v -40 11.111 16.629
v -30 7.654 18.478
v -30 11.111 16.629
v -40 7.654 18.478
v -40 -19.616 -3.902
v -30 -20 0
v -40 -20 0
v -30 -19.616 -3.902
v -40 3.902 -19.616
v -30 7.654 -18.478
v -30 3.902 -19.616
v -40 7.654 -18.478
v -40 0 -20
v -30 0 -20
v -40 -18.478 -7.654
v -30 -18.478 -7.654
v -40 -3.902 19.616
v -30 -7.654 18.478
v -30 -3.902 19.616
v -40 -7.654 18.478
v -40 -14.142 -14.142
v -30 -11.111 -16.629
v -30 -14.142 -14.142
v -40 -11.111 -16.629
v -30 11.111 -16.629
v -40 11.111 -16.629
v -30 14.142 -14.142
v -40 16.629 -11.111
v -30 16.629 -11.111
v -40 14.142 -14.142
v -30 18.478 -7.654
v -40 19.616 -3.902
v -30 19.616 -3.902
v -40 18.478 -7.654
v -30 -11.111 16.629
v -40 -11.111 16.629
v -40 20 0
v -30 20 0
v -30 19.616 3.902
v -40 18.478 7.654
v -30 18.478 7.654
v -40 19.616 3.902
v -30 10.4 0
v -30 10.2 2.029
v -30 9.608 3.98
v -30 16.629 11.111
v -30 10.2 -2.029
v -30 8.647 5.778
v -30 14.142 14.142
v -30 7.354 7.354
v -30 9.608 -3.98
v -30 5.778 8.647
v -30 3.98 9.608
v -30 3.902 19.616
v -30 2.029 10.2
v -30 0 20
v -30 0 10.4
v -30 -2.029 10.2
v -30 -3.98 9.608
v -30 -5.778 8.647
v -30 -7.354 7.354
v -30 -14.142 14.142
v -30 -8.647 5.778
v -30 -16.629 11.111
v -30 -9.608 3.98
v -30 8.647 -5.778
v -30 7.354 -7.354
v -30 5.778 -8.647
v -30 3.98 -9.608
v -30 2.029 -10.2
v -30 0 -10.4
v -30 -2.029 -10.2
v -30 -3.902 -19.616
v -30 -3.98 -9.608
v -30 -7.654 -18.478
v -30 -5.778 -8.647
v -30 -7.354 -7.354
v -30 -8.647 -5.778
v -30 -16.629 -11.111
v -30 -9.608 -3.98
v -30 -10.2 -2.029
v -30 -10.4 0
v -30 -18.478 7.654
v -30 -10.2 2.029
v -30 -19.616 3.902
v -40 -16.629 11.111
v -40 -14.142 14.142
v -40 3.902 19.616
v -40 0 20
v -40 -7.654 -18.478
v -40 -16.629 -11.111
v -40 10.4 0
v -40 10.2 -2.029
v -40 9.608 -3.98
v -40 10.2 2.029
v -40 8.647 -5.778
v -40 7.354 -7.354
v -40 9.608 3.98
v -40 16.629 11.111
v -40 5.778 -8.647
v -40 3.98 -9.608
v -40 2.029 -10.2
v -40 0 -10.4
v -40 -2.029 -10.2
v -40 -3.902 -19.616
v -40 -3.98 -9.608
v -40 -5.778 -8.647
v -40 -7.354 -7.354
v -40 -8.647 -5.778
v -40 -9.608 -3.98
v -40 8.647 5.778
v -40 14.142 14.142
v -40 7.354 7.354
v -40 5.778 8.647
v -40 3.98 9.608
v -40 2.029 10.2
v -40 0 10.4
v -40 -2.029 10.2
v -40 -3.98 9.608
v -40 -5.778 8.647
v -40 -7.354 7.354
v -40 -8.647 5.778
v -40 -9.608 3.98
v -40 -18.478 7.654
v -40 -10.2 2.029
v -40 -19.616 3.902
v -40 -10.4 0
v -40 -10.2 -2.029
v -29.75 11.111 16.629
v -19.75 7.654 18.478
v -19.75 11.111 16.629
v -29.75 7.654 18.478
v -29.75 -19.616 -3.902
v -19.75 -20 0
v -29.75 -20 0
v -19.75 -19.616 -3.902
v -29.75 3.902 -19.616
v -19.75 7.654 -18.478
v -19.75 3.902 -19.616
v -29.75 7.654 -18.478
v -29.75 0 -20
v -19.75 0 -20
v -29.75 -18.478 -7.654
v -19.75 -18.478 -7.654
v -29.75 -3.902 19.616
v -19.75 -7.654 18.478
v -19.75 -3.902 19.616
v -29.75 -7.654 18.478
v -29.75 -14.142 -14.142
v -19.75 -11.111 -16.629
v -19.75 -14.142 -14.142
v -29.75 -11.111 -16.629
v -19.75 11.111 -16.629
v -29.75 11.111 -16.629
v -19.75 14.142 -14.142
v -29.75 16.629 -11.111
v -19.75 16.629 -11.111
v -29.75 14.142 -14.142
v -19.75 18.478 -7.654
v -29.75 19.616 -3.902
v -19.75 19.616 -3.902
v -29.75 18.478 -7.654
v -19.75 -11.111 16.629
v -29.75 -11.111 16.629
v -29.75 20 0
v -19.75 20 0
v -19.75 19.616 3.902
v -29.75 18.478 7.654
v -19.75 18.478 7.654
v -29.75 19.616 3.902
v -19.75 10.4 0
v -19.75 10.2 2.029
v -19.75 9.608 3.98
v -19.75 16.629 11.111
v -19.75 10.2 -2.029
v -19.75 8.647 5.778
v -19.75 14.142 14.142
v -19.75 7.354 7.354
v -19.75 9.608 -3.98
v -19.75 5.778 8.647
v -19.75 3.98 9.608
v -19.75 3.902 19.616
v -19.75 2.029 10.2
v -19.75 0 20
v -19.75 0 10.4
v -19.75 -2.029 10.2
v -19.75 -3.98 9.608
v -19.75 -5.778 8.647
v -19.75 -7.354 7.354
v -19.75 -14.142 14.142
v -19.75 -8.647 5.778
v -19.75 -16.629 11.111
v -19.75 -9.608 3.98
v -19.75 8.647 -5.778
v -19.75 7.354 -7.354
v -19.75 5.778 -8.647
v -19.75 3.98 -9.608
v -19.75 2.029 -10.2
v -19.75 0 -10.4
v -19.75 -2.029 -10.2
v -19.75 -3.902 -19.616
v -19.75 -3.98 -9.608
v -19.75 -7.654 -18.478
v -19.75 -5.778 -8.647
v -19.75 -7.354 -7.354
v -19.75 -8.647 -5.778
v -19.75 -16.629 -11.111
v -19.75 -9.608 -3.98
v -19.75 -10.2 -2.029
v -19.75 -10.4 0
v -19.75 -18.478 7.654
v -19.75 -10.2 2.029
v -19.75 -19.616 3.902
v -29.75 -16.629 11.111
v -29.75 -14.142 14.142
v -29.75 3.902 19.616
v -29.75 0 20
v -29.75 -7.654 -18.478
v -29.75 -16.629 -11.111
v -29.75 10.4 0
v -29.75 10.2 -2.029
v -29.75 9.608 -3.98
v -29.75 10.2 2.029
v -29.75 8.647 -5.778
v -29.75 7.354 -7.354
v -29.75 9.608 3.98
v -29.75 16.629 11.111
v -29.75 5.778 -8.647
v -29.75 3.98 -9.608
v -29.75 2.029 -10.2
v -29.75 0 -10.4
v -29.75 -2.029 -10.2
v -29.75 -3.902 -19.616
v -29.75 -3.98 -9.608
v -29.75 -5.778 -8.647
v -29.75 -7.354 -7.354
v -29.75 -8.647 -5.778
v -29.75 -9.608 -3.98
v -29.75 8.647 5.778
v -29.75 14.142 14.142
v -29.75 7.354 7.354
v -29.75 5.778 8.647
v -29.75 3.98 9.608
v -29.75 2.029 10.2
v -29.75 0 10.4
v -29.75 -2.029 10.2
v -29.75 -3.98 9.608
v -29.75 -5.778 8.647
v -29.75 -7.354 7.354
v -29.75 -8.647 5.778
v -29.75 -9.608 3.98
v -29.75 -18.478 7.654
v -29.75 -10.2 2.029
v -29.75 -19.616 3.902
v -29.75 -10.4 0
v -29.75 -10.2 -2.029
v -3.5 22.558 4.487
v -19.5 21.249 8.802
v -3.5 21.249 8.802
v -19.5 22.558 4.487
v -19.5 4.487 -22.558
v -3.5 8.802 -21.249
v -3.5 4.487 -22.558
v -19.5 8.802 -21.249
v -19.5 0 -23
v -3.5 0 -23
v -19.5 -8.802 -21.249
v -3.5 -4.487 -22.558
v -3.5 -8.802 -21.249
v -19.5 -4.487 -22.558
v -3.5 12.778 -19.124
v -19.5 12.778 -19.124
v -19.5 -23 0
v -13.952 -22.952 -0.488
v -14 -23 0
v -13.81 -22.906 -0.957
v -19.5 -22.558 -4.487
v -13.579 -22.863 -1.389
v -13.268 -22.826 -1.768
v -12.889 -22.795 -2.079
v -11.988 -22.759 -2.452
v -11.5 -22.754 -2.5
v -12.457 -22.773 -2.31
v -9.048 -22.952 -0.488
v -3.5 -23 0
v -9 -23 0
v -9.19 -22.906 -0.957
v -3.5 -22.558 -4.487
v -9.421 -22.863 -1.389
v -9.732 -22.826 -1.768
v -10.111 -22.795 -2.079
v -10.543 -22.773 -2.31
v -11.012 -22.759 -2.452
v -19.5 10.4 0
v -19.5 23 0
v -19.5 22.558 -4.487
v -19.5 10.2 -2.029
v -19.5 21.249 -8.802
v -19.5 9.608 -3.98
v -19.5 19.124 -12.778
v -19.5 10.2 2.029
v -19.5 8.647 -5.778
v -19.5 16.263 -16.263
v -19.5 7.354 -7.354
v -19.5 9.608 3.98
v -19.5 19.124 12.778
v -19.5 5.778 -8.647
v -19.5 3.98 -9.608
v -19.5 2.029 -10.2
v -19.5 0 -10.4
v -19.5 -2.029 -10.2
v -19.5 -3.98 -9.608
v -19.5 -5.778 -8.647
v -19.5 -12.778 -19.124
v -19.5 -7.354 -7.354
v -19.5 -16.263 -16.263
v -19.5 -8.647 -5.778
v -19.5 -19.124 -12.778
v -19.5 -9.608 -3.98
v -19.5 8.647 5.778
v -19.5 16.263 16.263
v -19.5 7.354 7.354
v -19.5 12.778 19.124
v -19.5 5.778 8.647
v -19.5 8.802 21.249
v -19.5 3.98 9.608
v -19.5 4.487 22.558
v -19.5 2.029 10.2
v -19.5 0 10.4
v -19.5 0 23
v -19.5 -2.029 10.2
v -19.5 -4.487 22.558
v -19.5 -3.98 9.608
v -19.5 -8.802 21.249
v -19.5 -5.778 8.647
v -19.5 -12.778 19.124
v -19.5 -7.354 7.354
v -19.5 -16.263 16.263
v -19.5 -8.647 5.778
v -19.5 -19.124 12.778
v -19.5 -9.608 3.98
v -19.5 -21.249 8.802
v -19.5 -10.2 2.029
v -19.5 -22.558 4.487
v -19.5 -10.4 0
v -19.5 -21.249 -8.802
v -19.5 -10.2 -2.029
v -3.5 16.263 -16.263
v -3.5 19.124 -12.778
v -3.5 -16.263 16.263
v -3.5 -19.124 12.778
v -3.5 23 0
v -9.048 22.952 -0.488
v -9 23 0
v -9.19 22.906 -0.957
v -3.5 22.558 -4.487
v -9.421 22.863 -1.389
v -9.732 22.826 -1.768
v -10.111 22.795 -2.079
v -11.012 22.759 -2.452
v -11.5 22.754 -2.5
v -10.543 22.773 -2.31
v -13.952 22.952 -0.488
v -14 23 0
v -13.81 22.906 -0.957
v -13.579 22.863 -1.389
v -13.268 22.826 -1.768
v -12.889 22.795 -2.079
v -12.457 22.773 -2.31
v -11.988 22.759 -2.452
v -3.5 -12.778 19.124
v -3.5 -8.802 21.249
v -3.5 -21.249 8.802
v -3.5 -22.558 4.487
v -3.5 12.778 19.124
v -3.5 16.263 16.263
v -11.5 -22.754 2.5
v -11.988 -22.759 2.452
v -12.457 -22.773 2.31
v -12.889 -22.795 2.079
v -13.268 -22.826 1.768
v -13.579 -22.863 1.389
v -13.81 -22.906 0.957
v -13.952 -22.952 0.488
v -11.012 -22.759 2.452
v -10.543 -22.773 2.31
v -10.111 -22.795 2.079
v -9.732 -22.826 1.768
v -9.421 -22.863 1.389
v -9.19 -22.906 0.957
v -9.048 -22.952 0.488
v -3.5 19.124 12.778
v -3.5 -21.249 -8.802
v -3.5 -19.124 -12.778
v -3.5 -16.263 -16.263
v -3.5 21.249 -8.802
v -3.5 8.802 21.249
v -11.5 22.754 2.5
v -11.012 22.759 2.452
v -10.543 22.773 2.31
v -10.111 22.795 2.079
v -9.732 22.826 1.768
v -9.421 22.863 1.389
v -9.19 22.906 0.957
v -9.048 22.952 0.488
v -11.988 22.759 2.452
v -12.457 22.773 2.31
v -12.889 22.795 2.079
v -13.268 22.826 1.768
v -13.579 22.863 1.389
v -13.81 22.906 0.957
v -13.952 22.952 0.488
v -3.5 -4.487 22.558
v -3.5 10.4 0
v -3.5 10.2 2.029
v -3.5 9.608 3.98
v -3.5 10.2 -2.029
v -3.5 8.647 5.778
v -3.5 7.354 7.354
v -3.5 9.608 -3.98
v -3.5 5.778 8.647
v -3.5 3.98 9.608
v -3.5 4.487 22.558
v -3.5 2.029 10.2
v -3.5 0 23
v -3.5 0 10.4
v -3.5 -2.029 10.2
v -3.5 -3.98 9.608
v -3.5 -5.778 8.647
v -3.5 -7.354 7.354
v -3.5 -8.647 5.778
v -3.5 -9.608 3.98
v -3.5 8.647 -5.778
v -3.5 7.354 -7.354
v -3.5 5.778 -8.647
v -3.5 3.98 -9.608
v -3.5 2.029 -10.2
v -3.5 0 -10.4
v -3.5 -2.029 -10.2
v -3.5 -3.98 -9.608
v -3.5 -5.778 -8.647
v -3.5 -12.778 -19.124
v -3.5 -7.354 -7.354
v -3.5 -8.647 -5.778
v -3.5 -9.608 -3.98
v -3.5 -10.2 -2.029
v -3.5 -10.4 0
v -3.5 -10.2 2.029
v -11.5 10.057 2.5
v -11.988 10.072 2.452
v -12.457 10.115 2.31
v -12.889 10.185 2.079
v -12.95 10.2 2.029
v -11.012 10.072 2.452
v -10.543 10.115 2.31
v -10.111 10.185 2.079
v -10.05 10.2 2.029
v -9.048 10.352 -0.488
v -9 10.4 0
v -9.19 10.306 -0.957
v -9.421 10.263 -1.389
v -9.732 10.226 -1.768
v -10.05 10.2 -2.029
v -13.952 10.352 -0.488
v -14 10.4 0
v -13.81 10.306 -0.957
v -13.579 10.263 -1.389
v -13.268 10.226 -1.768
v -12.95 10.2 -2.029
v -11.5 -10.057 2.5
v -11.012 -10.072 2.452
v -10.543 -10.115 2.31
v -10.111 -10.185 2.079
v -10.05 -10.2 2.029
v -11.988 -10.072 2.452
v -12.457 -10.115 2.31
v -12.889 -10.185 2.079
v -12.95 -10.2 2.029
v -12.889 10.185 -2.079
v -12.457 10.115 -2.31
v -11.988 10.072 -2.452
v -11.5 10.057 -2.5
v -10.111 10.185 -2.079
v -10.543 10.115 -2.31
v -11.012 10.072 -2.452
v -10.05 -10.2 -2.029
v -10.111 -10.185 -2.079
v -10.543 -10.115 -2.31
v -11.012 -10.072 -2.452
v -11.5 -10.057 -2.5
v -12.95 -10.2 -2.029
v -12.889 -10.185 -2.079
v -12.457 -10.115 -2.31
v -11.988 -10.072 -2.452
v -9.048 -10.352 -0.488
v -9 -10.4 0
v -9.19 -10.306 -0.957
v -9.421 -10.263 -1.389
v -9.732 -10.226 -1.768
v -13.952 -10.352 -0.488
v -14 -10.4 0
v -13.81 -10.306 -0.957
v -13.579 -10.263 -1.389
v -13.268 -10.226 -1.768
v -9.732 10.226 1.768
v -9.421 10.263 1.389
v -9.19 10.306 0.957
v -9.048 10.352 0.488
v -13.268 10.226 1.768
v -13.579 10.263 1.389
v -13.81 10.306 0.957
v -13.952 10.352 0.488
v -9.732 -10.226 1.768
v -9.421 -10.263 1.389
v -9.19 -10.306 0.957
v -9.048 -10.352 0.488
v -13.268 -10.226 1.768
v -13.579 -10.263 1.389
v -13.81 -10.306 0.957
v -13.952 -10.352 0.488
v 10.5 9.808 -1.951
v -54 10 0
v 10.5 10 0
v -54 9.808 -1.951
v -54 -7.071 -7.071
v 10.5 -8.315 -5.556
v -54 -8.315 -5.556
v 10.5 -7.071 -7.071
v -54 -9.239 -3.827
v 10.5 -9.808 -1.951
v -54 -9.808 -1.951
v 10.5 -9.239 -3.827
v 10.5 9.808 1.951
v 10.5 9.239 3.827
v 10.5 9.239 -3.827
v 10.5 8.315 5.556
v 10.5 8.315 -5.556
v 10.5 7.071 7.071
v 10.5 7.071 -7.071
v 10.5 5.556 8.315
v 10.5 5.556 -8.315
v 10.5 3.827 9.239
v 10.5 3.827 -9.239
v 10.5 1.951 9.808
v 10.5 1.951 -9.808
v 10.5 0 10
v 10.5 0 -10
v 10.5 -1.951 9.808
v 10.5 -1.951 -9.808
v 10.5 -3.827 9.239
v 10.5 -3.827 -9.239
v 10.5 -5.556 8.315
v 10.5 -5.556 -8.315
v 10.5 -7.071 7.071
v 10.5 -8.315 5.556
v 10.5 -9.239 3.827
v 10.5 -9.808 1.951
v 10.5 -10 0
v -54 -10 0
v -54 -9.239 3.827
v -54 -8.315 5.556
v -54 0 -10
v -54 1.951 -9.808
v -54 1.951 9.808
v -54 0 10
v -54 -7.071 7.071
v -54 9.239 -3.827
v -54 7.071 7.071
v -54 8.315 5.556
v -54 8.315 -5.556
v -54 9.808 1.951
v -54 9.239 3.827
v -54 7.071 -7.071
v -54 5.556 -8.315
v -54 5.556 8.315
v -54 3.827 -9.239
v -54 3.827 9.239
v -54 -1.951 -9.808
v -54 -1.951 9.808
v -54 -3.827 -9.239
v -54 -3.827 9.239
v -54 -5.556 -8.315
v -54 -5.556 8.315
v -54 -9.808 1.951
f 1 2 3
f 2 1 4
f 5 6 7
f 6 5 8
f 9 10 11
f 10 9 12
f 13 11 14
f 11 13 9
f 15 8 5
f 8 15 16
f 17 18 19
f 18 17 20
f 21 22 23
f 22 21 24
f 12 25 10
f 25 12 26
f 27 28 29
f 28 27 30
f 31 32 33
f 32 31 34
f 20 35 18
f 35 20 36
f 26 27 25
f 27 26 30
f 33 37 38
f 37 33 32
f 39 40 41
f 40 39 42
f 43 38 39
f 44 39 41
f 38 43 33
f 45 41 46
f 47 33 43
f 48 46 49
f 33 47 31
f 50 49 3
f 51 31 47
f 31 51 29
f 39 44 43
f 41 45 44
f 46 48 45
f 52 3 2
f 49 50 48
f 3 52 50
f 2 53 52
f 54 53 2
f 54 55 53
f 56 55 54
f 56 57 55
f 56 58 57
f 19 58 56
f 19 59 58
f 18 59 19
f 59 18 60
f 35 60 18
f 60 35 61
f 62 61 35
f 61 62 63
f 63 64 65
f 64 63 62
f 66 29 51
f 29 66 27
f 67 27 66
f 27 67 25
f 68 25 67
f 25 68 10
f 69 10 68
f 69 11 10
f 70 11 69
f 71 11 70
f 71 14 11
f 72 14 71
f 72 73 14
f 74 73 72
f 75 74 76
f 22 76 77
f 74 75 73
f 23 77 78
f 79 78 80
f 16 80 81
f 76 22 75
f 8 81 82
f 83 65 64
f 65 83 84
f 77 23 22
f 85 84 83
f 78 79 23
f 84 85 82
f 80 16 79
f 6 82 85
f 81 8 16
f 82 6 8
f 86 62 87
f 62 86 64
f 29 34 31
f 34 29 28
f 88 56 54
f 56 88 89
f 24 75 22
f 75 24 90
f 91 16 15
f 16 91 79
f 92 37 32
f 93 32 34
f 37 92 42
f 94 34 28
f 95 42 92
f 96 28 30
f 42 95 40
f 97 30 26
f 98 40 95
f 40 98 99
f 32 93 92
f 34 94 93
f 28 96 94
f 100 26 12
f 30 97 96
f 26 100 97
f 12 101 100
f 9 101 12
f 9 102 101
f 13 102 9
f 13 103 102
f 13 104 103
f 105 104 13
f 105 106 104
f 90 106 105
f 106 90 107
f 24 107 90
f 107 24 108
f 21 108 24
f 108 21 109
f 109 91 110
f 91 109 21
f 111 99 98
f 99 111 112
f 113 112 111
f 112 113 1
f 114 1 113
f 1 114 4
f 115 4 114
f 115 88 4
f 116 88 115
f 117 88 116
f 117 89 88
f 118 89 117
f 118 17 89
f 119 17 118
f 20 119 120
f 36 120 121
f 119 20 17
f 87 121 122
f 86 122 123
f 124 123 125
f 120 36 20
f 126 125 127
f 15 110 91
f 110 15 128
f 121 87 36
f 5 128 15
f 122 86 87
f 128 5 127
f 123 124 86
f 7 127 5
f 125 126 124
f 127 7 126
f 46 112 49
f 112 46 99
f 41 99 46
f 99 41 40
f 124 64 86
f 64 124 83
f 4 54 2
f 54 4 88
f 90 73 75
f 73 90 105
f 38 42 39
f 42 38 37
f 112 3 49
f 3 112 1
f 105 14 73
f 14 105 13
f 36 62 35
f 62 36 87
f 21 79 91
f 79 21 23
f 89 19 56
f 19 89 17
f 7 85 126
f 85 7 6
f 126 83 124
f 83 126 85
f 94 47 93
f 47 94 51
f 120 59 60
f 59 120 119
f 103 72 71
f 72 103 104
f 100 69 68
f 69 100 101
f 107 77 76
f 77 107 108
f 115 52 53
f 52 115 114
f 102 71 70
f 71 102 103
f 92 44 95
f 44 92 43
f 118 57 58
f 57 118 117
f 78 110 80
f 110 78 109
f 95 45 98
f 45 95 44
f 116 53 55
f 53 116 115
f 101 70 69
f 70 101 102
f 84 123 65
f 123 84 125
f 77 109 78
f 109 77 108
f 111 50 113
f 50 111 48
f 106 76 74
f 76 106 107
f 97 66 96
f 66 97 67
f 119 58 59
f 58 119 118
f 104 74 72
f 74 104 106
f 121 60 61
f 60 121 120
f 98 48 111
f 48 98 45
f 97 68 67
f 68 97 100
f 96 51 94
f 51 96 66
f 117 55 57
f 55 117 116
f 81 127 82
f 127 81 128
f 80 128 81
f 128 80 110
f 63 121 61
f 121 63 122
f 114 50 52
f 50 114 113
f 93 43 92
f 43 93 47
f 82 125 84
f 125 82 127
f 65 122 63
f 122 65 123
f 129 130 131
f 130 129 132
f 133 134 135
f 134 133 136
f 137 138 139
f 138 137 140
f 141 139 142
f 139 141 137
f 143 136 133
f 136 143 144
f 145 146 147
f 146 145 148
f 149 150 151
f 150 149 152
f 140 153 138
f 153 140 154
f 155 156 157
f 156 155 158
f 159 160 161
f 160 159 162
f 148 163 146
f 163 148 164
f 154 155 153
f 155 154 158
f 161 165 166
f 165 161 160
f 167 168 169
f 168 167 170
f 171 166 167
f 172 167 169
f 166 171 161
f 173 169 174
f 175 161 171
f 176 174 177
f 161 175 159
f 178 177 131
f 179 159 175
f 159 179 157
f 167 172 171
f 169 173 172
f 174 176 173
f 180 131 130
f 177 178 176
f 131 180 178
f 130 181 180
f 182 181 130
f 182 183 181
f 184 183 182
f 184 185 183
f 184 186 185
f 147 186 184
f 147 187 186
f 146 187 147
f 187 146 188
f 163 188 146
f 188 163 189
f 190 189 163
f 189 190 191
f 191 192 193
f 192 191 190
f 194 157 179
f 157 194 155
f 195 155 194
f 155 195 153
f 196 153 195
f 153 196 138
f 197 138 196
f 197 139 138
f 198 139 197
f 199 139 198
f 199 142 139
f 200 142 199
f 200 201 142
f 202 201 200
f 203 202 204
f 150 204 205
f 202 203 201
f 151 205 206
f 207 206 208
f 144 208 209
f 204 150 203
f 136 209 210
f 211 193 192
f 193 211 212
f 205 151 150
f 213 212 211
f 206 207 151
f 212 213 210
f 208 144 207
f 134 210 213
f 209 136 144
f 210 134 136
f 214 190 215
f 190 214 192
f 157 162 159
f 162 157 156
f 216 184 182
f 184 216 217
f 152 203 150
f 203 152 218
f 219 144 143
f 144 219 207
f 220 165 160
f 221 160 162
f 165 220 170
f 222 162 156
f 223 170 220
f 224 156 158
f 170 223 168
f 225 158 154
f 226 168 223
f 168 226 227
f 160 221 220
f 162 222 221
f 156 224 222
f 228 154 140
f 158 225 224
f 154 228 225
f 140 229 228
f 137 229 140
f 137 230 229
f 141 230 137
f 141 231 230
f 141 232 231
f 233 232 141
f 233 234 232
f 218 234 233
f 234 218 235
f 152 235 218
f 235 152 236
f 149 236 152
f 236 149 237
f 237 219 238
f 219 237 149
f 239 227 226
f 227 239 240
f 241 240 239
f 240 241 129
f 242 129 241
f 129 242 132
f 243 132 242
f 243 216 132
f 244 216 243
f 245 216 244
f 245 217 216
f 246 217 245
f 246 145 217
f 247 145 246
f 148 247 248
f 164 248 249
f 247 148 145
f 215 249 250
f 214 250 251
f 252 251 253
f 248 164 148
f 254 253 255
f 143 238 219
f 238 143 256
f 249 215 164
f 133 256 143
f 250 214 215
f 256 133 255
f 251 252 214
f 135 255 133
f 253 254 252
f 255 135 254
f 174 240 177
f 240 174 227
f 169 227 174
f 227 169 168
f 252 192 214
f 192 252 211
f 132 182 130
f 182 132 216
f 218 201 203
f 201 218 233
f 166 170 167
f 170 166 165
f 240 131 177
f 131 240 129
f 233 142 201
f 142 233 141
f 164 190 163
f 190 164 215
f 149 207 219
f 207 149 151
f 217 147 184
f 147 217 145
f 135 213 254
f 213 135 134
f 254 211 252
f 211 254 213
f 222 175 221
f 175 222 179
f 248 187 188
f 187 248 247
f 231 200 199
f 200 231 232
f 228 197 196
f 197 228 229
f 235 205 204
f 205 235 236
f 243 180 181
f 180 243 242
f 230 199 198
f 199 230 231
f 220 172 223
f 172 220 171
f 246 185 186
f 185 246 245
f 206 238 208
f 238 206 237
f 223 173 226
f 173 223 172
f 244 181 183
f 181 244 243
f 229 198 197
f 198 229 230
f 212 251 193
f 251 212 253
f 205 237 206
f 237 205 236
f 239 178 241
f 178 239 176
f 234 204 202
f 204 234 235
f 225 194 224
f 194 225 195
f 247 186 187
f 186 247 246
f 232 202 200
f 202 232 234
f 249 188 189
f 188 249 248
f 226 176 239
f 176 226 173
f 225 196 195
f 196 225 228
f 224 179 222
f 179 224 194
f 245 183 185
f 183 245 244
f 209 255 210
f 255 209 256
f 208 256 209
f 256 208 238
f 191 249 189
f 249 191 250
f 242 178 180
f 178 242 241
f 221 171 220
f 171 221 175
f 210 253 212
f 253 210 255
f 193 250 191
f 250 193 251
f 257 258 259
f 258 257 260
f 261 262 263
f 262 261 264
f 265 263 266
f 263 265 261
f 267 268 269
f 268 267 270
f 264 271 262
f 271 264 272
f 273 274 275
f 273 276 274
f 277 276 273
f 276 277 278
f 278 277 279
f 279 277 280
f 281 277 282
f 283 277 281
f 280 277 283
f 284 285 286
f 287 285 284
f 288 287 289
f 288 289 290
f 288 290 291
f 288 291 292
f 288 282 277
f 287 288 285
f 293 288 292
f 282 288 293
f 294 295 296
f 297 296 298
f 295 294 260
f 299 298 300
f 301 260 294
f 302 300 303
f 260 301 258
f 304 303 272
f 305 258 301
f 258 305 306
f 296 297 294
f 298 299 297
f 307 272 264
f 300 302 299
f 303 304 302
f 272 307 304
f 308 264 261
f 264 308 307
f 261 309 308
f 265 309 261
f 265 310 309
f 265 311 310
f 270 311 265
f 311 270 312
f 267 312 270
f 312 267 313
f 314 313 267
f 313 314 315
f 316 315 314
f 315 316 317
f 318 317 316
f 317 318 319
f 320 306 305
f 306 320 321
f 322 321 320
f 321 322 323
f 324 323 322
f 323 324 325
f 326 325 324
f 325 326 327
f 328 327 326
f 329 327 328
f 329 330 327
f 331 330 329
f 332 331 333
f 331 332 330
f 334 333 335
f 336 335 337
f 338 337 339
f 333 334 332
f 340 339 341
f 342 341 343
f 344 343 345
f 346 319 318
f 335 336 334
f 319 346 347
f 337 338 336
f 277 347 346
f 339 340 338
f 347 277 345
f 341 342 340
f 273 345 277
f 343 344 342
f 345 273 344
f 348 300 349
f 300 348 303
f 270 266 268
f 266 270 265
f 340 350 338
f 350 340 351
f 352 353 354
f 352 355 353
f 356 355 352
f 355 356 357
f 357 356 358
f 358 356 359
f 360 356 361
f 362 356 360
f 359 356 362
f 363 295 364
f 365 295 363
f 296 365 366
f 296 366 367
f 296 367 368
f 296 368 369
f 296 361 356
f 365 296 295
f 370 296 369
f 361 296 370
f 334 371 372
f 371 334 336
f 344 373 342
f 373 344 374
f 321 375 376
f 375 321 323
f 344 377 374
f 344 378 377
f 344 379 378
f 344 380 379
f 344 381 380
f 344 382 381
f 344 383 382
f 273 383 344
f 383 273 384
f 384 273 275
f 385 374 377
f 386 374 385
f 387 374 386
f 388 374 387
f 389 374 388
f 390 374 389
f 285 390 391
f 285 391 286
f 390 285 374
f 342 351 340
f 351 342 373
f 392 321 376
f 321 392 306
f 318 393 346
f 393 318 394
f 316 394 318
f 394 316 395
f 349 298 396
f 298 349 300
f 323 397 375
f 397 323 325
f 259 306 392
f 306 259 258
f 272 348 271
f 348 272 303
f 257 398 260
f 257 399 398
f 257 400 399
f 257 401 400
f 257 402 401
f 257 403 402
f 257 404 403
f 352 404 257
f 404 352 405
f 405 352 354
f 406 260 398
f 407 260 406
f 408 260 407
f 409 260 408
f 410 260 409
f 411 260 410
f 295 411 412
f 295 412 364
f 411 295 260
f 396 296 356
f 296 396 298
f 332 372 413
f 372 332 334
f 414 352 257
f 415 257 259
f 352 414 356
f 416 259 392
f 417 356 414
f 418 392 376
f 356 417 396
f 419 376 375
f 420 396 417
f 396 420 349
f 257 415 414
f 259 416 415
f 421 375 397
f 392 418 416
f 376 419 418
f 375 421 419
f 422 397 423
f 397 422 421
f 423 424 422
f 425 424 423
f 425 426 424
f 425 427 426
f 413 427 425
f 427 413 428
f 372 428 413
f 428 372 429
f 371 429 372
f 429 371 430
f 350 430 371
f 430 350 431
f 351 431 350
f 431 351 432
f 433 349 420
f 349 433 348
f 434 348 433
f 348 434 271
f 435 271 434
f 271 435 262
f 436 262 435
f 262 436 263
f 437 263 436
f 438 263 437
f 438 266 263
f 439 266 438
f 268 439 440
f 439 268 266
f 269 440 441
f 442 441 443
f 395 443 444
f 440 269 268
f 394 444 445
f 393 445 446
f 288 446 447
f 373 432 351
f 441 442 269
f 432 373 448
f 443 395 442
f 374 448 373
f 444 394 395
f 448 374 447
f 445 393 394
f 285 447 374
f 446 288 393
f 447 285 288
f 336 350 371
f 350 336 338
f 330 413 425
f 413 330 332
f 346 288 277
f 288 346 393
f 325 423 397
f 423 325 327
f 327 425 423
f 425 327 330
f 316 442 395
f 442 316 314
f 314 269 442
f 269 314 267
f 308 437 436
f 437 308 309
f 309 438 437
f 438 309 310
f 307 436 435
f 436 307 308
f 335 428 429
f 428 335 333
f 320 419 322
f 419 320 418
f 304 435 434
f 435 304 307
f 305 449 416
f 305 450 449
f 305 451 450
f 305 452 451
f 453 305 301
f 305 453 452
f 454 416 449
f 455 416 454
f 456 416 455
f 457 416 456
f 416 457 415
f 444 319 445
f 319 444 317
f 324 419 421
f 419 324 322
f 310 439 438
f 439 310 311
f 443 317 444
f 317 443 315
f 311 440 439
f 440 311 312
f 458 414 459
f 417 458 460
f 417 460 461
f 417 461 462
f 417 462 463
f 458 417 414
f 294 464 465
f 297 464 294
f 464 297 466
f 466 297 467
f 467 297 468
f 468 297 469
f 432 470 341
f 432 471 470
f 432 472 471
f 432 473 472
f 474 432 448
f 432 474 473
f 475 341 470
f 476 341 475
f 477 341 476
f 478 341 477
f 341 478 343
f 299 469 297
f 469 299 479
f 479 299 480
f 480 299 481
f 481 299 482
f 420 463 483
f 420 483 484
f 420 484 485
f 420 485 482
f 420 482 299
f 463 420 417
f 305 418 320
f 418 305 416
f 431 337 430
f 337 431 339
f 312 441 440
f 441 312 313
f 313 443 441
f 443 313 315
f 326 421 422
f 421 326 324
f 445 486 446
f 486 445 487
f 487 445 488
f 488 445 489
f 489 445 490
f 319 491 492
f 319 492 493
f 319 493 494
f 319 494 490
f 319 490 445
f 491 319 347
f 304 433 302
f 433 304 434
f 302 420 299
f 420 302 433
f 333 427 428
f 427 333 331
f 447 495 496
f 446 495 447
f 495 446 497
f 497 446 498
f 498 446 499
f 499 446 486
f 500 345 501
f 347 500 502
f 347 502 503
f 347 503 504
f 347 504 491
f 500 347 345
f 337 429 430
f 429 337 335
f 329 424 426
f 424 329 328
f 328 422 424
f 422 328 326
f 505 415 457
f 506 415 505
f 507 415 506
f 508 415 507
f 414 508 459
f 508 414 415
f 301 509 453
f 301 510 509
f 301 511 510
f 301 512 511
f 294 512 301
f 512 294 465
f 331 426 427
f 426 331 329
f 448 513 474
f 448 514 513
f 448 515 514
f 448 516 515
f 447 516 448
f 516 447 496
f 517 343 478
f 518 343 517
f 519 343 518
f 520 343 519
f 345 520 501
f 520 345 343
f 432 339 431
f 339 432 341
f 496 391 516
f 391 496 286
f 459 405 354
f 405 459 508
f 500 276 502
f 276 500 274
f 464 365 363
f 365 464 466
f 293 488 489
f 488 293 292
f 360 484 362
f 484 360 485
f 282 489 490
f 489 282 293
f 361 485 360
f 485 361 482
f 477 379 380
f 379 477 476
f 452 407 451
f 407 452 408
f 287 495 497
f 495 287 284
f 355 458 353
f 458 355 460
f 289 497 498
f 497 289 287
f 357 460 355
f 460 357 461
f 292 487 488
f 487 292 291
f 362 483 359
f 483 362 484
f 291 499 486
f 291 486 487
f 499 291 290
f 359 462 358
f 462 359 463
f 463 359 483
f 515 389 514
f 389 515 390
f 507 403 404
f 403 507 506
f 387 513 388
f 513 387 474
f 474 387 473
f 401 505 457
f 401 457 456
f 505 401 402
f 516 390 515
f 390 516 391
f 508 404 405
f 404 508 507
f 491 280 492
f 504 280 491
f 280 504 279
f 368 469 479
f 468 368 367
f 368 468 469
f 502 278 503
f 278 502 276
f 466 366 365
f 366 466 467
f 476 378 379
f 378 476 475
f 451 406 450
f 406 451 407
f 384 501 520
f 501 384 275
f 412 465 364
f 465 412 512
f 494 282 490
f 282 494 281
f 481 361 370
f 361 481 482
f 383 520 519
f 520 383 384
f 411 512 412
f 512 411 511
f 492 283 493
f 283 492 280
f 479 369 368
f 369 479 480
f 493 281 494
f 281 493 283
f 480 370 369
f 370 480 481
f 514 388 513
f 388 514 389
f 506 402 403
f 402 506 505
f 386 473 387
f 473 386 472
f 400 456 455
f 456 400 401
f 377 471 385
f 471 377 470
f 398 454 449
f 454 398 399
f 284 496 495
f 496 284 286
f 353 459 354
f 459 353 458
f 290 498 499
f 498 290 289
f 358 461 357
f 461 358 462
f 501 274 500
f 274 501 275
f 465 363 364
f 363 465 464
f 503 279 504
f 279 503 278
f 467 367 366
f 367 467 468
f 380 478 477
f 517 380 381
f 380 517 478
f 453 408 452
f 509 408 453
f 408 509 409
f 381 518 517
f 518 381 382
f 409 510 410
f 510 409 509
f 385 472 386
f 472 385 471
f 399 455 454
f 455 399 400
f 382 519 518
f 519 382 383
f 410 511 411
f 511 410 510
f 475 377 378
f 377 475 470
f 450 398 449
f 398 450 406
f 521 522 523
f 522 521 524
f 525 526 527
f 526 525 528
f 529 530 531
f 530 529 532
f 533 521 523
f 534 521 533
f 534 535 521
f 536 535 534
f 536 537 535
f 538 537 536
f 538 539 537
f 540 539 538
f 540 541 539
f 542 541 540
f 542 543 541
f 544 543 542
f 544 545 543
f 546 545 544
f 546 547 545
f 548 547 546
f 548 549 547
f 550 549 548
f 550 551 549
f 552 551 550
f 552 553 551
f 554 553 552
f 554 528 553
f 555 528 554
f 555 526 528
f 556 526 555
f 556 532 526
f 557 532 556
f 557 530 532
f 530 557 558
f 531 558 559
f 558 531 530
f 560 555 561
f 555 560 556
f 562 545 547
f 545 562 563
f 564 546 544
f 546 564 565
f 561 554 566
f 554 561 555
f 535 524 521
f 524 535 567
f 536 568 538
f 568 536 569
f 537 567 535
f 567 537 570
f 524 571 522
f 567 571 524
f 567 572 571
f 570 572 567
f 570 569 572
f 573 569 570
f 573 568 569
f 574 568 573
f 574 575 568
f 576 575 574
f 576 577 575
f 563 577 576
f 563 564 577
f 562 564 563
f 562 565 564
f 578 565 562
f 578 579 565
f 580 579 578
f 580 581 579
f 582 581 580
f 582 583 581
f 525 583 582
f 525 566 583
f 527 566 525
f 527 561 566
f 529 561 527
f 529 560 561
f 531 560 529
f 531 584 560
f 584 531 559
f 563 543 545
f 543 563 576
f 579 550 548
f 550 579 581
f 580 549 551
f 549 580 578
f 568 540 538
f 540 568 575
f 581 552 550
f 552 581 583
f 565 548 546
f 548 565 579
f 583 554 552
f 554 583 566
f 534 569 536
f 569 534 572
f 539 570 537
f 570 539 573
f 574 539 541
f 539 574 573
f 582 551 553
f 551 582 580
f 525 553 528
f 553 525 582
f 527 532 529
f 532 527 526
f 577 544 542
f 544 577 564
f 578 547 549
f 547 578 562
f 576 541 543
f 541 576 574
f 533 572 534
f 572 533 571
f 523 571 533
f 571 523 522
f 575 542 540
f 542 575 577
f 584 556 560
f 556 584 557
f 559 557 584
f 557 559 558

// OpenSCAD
$fn = 32;

// ------------------------------------------------------------------------
// Shaft with rings and collars: d20 shaft, 3 rings
// Every part is its own module, assembly() places them once.
// ------------------------------------------------------------------------

// --- part 1 ---
module shaft() {
  translate([0, 0, -32.25]) cylinder(h = 64.5, d = 20);
}

// --- part 2 ---
module spacer_a() {
  difference() {
      translate([0, 0, 0]) cylinder(h = 10, d = 40);
      translate([0, 0, -1]) cylinder(h = 12, d = 20.8);
    }
}

// --- part 3 ---
module spacer_b() {
  difference() {
      translate([0, 0, 0]) cylinder(h = 10, d = 40);
      translate([0, 0, -1]) cylinder(h = 12, d = 20.8);
    }
}

// --- part 4 ---
module collar_a() {
  difference() {
    cylinder(h = 16, d = 46);
    translate([0, 0, -1]) cylinder(h = 18, d = 20.8);
    translate([0, 0, 8]) rotate([90, 0, 0]) cylinder(h = 48, d = 5, center = true);
  }
}

// --- assembly ---
module assembly() {
  translate([-21.75, 0, 0]) rotate([0, 90, 0]) shaft();
  translate([-40, 0, 0]) rotate([0, 90, 0]) spacer_a();
  translate([-29.75, 0, 0]) rotate([0, 90, 0]) spacer_b();
  translate([-19.5, 0, 0]) rotate([0, 90, 0]) collar_a();
}

assembly();
